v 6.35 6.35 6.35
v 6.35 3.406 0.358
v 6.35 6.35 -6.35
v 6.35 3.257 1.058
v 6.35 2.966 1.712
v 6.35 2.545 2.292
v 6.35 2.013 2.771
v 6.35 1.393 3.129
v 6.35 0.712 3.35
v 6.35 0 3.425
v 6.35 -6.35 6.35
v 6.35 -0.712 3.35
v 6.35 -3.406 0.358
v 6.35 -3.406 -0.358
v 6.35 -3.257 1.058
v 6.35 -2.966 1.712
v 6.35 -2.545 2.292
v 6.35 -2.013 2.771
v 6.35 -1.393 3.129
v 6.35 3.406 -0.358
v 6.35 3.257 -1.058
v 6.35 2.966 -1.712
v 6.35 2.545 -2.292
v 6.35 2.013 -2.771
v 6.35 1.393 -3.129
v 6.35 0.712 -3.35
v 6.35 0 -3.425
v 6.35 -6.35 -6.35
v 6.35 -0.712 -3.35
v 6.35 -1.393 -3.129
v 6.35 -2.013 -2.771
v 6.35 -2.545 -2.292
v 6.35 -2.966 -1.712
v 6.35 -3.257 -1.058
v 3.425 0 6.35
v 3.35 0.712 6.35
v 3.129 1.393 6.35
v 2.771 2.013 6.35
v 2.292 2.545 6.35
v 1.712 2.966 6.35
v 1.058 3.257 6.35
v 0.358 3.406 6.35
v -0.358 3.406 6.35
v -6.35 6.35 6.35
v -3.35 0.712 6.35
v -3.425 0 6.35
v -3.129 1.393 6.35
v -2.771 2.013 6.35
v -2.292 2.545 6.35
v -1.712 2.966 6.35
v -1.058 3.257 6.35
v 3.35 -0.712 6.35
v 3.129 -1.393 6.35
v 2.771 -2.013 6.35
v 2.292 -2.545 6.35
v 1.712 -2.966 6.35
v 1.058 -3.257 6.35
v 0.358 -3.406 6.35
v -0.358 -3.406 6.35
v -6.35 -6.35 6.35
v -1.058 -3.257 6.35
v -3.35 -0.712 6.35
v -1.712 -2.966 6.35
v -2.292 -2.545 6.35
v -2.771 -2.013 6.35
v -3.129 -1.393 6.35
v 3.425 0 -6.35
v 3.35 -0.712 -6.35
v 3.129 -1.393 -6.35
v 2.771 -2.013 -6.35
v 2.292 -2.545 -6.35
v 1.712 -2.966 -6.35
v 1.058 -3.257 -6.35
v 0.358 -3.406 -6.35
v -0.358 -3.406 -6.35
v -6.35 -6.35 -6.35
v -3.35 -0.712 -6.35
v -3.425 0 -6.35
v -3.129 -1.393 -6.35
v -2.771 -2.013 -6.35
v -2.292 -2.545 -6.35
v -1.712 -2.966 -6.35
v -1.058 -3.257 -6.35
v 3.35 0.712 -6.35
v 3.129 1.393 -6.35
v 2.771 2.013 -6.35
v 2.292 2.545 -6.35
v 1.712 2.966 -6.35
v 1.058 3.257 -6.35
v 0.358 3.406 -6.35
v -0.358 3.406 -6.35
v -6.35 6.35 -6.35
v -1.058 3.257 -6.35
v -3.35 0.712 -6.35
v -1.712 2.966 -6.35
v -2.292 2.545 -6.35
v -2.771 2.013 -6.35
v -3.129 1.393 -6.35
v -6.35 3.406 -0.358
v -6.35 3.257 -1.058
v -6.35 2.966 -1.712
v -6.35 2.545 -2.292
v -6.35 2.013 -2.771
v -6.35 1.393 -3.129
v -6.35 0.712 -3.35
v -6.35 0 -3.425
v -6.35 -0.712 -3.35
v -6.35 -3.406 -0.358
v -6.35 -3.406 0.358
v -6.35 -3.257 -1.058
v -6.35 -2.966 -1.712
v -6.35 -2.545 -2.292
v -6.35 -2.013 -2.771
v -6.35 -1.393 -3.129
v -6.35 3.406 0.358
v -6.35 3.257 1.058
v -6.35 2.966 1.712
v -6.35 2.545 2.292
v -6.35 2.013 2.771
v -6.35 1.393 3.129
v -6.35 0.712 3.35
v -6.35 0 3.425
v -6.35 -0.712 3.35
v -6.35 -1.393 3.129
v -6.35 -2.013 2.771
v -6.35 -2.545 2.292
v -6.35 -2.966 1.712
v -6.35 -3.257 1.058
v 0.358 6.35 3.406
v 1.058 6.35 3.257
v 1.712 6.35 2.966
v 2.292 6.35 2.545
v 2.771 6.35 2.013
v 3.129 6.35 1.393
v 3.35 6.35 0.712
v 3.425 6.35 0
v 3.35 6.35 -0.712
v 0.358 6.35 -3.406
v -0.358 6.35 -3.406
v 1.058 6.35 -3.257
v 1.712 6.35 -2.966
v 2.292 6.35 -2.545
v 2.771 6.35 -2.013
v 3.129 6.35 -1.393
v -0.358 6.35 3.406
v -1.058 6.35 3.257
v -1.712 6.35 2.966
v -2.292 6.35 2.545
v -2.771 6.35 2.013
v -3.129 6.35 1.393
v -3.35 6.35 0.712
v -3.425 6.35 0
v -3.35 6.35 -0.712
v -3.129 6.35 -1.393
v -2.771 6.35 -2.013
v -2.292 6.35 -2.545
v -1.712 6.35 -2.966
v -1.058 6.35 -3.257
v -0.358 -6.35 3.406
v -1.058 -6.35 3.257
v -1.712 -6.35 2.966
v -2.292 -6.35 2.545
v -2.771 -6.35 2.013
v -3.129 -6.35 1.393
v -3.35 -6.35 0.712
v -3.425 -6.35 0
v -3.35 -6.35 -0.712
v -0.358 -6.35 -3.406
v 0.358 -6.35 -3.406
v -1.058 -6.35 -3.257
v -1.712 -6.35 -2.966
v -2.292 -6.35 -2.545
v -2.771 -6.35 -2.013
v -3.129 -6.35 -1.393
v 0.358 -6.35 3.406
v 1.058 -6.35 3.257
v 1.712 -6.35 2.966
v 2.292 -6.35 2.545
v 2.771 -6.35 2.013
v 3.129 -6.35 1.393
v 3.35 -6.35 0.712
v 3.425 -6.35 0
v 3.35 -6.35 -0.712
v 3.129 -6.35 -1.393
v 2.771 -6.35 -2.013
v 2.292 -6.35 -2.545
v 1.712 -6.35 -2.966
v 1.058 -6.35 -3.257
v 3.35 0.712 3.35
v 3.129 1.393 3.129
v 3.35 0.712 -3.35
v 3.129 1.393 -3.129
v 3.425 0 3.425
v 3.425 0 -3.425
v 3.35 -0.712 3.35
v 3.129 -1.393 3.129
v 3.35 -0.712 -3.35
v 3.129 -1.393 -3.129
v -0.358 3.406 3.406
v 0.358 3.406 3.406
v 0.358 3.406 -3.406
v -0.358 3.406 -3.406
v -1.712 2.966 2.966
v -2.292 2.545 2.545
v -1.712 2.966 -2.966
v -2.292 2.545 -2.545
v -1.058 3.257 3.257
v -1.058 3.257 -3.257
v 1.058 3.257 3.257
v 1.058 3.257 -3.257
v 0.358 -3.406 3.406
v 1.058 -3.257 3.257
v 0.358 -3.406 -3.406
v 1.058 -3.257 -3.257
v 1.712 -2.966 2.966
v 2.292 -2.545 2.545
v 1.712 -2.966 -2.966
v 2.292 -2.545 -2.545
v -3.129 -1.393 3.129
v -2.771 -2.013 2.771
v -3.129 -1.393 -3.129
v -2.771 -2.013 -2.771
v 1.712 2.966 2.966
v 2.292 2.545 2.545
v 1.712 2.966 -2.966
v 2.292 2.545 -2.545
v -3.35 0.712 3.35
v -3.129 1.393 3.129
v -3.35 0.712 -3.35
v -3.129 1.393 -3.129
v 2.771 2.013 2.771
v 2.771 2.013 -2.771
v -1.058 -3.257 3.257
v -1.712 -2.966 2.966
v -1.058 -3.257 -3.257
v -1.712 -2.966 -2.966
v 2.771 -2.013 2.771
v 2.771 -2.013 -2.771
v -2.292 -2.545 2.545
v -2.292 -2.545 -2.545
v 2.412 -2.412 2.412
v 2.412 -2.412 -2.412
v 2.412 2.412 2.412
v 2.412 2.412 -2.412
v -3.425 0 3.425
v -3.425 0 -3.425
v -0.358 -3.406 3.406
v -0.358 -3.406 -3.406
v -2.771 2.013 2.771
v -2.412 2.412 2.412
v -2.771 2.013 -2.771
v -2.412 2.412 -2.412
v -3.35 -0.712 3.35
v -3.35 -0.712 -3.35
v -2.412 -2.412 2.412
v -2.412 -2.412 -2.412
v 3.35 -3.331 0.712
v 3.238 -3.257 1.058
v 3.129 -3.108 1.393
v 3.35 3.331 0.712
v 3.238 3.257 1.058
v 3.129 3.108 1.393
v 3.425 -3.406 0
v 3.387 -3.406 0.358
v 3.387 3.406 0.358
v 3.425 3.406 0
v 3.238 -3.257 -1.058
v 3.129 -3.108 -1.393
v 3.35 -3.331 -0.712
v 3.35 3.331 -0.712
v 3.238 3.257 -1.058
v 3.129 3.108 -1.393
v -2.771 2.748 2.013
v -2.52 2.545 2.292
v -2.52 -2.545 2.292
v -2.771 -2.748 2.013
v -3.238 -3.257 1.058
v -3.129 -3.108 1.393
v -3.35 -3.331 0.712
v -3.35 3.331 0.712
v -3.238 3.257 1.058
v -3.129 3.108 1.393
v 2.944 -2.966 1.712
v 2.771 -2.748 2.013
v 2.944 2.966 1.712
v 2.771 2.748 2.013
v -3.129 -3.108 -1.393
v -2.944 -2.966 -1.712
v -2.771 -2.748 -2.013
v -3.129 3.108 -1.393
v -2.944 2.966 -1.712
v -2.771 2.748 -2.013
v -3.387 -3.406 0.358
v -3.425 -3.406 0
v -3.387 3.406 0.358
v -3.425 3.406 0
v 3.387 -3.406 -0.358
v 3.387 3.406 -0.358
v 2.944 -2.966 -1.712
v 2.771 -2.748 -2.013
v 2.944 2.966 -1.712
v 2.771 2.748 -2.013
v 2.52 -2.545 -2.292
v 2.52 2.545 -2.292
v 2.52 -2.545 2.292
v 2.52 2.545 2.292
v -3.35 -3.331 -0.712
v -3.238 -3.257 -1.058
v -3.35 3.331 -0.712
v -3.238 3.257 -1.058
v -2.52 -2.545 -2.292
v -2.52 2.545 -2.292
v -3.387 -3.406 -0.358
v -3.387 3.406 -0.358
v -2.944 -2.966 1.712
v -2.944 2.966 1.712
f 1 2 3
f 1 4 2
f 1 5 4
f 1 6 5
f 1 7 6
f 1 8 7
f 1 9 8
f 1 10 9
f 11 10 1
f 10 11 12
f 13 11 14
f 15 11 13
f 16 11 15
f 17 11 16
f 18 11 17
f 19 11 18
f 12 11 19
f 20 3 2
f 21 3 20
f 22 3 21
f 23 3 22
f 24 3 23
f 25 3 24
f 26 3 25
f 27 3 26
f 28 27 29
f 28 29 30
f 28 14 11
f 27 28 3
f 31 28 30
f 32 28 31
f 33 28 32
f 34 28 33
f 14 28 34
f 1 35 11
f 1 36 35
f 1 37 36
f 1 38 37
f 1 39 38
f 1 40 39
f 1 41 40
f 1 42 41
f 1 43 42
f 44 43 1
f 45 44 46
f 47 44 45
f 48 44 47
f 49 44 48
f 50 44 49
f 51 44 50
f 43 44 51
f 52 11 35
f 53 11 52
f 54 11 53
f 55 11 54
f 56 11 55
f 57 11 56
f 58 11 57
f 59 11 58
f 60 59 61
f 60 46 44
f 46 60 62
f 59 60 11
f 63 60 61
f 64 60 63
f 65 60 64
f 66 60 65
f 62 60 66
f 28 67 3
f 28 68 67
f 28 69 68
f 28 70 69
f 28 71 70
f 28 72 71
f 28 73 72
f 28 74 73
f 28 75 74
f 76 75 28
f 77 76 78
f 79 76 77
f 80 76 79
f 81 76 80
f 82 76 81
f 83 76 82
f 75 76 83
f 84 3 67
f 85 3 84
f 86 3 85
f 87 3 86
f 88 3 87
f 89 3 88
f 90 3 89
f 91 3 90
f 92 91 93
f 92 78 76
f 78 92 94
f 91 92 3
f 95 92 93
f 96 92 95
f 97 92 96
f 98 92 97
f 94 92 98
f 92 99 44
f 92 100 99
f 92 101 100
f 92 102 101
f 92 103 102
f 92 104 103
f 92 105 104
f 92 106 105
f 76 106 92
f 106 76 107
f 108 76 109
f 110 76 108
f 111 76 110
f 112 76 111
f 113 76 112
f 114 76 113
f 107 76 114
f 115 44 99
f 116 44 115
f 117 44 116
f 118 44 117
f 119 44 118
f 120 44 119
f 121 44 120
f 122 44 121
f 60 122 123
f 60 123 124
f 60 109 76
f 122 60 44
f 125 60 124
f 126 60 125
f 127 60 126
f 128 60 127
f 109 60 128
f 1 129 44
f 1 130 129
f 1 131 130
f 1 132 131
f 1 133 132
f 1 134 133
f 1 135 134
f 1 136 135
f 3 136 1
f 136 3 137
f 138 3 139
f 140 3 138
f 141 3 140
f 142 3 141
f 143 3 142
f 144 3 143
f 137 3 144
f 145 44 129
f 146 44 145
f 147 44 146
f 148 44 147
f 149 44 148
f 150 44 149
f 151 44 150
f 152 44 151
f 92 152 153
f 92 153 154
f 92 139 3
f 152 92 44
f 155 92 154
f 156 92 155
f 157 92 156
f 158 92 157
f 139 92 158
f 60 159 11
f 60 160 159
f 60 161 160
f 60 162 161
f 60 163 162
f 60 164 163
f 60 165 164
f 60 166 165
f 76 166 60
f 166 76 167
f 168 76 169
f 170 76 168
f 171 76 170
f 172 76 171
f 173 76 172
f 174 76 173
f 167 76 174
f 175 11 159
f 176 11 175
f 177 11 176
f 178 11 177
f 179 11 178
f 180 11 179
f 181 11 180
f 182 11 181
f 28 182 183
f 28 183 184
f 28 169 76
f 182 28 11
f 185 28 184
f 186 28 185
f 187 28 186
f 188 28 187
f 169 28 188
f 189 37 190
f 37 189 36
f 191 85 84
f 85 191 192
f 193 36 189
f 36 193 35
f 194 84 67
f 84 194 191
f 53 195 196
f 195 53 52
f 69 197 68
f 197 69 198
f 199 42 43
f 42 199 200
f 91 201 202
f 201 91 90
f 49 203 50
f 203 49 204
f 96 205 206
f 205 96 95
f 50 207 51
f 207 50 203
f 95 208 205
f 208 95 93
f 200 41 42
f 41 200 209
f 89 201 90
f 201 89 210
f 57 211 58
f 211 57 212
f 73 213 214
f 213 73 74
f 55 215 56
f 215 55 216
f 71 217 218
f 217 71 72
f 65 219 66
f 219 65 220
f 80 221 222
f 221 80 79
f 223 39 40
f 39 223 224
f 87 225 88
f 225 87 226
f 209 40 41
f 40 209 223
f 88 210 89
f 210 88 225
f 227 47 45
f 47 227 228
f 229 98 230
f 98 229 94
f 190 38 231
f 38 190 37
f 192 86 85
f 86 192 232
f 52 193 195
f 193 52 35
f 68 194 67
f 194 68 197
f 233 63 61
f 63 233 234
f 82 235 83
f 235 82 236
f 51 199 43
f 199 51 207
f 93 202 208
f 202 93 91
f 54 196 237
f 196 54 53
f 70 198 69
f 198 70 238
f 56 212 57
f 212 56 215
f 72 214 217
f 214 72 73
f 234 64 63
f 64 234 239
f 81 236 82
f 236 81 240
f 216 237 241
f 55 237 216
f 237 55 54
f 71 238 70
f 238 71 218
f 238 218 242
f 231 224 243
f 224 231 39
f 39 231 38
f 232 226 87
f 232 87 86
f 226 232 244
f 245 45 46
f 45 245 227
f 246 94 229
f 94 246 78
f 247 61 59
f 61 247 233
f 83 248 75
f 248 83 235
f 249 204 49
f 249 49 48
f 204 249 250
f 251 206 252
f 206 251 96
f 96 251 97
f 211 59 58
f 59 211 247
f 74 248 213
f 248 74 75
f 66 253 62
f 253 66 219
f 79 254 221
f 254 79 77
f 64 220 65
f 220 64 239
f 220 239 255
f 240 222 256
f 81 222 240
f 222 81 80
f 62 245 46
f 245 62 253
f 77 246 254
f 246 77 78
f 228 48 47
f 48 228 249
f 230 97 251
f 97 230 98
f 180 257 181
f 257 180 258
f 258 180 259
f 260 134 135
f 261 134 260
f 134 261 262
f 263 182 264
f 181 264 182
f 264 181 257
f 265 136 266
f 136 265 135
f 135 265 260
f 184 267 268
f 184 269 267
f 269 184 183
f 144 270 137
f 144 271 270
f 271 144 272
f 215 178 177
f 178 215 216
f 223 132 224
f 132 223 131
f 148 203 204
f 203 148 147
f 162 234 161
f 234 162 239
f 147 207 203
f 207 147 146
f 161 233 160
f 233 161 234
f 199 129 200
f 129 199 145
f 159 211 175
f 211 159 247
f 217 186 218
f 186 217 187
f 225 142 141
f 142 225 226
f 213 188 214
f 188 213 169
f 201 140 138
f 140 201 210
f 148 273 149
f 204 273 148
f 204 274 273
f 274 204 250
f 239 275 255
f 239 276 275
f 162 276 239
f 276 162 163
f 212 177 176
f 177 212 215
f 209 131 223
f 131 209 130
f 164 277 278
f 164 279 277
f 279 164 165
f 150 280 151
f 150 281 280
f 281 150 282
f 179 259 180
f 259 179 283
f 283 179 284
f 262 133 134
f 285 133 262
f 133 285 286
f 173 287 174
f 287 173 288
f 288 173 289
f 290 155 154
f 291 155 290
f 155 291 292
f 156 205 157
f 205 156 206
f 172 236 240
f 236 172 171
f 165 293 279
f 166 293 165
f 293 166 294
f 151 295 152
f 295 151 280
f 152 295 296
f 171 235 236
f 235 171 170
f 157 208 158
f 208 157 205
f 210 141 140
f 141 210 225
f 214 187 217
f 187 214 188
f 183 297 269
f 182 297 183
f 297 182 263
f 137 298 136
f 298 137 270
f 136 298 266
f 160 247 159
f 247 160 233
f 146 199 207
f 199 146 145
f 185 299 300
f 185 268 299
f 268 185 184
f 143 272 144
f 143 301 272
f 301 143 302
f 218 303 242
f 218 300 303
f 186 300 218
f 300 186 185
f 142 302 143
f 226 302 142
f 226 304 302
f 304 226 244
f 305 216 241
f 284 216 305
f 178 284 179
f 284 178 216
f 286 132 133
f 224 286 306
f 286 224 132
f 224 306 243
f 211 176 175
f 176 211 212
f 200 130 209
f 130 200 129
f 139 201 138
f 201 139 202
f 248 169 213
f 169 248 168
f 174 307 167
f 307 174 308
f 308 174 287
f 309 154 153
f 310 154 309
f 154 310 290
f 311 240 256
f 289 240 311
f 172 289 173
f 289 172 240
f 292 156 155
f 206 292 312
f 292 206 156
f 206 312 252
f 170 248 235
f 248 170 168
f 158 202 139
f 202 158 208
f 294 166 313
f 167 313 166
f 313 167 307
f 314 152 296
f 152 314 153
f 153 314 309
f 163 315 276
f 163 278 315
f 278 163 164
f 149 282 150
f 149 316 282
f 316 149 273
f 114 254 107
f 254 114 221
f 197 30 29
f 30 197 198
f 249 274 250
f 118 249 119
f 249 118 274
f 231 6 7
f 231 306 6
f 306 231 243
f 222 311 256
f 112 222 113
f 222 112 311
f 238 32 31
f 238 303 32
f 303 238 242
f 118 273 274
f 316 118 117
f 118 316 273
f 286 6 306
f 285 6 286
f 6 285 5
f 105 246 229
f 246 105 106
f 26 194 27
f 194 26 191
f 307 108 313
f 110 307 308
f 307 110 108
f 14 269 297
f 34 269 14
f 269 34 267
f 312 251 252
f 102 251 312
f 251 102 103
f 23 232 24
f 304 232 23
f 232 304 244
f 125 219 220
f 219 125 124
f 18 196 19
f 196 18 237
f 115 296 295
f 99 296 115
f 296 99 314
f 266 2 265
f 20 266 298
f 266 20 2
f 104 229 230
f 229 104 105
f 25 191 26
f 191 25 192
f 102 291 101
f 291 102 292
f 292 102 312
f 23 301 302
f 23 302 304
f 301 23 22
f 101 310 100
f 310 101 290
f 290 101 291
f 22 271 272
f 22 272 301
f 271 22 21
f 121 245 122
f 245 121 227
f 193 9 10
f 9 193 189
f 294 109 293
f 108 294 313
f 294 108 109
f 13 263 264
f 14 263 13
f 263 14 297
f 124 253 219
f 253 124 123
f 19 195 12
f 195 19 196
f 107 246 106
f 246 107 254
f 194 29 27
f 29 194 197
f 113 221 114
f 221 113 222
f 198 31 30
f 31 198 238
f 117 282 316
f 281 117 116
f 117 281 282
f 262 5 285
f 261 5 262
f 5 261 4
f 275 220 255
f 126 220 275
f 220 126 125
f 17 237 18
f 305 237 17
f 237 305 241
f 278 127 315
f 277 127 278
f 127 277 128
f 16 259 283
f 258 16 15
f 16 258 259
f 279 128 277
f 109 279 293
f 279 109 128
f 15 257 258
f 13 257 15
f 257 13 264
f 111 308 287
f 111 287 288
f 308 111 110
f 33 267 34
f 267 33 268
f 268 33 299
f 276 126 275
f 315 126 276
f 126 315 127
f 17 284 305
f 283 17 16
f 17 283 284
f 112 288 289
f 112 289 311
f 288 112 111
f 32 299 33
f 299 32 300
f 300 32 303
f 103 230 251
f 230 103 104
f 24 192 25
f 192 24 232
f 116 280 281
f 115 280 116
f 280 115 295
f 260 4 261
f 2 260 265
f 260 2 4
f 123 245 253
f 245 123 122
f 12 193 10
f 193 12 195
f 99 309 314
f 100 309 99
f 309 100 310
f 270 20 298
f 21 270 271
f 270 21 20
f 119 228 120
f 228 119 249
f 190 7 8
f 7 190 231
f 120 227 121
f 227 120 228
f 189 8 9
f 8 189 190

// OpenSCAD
in=25.4;
l=in/2;
d=0.5+l/2;

echo(l=l);
echo(d=d);

$fn=30;
difference() {
    cube(l,l,l, center=true);
    cylinder(d=d, h=l*2, center=true);
    rotate([90, 0, 0])     cylinder(d=d, h=l*2, center=true);
    rotate([0, 90, 0])     cylinder(d=d, h=l*2, center=true);
}
